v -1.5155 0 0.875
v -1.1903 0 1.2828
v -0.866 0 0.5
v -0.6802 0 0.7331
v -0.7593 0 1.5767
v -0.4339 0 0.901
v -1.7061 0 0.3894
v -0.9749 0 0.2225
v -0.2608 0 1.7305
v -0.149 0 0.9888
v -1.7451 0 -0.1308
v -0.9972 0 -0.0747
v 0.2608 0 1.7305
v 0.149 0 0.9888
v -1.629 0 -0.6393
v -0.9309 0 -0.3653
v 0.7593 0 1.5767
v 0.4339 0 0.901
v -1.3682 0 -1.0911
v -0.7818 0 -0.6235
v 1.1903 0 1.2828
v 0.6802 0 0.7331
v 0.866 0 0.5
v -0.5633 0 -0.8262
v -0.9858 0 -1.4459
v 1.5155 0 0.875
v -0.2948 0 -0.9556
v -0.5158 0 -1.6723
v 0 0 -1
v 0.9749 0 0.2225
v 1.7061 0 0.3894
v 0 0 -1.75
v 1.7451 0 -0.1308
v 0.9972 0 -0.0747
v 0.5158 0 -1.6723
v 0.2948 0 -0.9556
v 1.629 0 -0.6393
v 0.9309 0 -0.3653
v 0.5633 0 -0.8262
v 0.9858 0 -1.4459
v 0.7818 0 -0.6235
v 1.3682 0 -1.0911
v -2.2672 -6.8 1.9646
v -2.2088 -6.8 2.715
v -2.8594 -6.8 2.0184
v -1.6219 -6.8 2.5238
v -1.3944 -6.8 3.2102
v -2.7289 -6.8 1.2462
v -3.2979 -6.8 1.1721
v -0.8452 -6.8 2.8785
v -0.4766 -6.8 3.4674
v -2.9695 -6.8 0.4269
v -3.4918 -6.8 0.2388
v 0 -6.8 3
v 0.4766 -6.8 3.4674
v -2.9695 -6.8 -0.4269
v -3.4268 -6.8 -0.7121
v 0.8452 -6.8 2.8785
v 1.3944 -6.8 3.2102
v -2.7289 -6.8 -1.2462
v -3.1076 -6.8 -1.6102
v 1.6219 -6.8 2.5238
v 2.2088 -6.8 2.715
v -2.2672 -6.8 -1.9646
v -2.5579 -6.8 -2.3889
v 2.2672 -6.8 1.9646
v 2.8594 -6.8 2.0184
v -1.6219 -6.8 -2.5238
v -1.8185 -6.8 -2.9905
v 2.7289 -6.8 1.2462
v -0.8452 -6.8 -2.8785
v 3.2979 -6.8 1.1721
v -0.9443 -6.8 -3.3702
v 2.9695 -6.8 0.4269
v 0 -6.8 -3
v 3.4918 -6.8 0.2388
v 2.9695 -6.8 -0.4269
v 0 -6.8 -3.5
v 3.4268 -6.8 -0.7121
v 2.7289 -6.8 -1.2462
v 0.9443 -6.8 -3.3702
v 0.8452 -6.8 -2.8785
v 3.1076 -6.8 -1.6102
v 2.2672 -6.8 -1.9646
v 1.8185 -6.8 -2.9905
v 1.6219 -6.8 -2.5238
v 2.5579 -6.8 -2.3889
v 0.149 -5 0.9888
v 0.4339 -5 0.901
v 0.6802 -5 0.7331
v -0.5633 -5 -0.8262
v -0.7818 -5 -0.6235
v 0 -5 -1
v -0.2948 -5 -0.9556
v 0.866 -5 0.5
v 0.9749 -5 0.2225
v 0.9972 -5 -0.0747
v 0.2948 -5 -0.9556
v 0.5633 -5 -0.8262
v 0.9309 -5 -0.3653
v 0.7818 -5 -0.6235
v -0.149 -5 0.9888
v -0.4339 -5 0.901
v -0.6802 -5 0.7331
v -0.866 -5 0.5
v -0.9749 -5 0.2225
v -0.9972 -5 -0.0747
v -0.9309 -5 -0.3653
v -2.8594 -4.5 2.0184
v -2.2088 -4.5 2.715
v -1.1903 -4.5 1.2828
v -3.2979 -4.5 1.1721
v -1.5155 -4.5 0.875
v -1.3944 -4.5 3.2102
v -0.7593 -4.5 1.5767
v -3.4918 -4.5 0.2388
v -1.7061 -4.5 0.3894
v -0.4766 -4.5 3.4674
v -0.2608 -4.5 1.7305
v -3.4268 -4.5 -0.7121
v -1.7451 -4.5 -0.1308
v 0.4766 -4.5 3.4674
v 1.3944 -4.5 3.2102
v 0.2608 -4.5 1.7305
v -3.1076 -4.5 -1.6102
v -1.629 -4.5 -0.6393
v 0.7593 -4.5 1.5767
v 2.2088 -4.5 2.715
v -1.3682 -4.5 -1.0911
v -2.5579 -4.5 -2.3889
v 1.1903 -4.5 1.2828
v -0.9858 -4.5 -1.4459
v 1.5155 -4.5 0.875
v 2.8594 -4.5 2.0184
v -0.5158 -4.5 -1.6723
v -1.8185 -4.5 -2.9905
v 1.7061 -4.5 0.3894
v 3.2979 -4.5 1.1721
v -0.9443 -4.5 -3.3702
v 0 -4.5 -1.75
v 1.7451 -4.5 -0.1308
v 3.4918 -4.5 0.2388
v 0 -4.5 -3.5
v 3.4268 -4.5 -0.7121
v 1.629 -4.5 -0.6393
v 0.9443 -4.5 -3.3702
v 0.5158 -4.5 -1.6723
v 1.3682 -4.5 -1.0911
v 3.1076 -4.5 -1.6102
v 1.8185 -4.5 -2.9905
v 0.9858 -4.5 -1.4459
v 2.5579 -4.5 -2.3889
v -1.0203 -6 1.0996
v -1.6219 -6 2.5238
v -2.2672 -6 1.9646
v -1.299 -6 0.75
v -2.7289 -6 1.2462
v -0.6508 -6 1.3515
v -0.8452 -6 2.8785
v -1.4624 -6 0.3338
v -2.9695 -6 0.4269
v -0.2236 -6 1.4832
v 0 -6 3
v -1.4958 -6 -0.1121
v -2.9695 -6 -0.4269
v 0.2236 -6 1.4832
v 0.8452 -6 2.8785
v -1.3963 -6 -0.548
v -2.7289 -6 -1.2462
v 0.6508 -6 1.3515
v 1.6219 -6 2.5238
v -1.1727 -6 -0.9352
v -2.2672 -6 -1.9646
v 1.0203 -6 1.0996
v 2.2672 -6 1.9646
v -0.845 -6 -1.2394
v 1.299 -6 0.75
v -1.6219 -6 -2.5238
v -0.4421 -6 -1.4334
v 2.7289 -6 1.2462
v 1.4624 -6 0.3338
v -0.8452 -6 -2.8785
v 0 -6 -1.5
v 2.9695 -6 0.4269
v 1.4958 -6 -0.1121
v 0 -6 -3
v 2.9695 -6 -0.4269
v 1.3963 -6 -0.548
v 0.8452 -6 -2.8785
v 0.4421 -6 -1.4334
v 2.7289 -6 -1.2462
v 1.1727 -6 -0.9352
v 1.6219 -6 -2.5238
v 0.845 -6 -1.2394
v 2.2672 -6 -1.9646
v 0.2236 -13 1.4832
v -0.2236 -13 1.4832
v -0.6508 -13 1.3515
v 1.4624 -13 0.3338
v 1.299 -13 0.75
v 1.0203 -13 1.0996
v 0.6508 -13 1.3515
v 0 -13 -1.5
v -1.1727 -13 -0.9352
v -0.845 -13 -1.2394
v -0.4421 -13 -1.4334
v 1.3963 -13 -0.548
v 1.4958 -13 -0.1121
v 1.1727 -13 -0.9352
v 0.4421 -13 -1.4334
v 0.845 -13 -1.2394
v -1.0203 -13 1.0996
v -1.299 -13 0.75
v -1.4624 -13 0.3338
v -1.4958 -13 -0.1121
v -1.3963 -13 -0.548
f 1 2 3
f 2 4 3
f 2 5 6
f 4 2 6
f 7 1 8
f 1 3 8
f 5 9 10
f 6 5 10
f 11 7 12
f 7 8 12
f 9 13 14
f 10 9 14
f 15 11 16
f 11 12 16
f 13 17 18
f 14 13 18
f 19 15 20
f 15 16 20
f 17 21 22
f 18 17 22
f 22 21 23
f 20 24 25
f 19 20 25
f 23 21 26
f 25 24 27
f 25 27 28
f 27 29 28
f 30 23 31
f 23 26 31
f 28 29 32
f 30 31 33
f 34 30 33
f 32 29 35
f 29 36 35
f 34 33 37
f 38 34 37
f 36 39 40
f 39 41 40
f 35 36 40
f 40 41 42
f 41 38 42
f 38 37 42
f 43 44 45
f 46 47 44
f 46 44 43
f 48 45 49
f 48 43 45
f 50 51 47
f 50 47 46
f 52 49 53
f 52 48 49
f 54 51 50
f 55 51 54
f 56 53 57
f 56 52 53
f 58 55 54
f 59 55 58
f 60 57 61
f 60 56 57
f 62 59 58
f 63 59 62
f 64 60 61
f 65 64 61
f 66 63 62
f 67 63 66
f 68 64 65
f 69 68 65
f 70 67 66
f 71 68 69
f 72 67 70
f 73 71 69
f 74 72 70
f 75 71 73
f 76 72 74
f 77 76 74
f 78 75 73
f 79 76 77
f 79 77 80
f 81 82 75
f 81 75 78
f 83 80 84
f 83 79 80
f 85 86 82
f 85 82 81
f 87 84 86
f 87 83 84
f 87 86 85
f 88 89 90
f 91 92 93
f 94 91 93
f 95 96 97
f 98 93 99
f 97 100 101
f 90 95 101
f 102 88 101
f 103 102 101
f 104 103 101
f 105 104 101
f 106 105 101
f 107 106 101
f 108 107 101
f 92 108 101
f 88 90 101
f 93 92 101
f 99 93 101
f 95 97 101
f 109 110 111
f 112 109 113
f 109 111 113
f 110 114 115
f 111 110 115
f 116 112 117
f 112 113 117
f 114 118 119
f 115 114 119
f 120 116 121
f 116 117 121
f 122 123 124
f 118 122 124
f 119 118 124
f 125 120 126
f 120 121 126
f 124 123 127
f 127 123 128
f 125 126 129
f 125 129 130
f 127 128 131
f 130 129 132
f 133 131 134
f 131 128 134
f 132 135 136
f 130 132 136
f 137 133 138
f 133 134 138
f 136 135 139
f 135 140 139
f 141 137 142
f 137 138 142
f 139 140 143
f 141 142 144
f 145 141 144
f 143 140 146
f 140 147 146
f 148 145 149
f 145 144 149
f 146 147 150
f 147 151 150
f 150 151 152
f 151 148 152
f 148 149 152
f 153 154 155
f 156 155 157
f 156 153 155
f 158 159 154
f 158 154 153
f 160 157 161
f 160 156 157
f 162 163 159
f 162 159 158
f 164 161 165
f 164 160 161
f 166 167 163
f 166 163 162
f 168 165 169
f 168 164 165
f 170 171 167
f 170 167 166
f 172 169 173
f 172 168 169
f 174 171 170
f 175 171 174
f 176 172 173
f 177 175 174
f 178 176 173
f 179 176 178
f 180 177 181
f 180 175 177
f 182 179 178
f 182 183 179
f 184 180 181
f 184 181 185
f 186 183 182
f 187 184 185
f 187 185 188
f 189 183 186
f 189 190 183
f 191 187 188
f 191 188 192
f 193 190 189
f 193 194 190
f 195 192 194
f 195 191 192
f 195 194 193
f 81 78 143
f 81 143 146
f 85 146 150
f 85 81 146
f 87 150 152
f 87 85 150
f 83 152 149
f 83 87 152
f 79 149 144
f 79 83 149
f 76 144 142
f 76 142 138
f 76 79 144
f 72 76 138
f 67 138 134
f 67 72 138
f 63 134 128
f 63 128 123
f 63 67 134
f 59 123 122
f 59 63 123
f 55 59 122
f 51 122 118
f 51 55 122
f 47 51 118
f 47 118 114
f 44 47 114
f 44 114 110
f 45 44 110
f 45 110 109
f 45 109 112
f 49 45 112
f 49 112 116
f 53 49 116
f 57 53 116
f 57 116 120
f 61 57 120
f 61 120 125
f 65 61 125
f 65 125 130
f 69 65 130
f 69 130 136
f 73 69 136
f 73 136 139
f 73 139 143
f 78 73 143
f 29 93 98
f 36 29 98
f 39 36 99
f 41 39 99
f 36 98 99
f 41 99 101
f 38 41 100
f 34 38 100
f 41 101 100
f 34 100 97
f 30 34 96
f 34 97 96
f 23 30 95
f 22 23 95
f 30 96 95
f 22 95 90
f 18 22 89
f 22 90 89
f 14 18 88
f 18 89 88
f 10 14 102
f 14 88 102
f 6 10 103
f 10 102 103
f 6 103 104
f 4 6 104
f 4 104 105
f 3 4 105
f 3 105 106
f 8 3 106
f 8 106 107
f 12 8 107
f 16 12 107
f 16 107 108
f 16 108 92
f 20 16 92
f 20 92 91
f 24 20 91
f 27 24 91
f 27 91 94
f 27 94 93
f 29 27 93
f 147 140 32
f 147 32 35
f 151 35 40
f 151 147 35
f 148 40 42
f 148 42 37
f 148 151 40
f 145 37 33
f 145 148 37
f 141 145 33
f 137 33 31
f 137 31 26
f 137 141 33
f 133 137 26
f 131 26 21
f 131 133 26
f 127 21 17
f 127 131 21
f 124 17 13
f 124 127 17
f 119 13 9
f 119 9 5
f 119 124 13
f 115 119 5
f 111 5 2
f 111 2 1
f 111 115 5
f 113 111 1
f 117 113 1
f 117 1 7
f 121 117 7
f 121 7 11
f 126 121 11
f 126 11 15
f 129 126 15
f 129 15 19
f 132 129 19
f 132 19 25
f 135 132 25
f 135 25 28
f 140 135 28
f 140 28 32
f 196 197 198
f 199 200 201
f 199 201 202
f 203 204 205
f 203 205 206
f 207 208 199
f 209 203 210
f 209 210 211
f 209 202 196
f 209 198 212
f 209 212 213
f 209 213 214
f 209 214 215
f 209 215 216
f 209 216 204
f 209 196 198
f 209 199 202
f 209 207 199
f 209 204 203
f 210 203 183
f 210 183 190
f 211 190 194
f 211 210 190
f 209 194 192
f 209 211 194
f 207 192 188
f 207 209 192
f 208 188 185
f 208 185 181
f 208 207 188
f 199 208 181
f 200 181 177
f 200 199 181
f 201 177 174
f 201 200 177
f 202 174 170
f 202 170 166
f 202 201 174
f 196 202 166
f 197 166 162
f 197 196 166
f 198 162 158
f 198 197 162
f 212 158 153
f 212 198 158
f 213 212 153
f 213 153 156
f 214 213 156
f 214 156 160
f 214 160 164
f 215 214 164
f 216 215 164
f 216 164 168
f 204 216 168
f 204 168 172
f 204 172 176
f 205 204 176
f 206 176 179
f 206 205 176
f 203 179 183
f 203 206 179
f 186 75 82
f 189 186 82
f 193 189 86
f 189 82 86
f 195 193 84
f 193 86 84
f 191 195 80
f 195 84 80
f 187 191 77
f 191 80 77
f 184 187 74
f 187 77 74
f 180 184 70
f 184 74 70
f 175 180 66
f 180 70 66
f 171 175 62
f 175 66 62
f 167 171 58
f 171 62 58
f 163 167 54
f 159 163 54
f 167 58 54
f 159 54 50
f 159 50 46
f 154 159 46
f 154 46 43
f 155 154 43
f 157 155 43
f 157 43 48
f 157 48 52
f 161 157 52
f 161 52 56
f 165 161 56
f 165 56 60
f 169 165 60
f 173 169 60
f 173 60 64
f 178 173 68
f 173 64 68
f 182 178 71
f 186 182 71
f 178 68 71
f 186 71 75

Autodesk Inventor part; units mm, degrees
ref_plane "YZ Plane" through (0, 0, 0) normal (1, 0, 0) x (0, 1, 0)
ref_plane "XZ Plane" through (0, 0, 0) normal (0, 1, 0) x (-1, 0, 0)
ref_plane "XY Plane" through (0, 0, 0) normal (0, 0, 1) x (1, 0, 0)
sketch "Sketch1" plane through (0, 0, 0) normal (1, 0, 0) x (0, 1, 0)
  line L0 (0, -1) -> (-5, -1)
  line L1 (-5, -1) -> (-5, 0)
  line L2 (-4.5, -3.5) -> (-6.8, -3.5)
  line L3 (-6, -1.5) -> (-13, -1.5)
  line L4 (-13, -1.5) -> (-13, 0)
  line L5 (-6, -1.5) -> (-6, -3)
  line L6 (-6, -3) -> (-6.8, -3)
  line L7 (-6.8, -3) -> (-6.8, -3.5)
  line L8 (0, 0) -> (-1.5156, 0)
  line L9 (-5, 0) -> (-13, 0)
  line L10 (0, -1) -> (0, -1.75)
  line L11 (0, -1.75) -> (-4.5, -1.75)
  line L12 (-4.5, -1.75) -> (-4.5, -3.5)
  dimension "d4" = 0.5
  dimension "d5" = 1.5
  dimension "d6" = 0.8
  dimension "d7" = 1
  dimension "d11" = 8
  dimension "d12" = 2
  dimension "d13" = 5
  dimension "d14" = 3
  dimension "d15" = 1.5
  dimension "d16" = 3.5
  dimension "d17" = 7
revolve "Revolution1" add sketch "Sketch1" angle 360 about axis through (0, 0, 0) along (0, -1, 0)
thread "Thread1" size "M3x0.5" class "6g" standard "ANSI Metric M Profile" length 5
properties part number "042"
